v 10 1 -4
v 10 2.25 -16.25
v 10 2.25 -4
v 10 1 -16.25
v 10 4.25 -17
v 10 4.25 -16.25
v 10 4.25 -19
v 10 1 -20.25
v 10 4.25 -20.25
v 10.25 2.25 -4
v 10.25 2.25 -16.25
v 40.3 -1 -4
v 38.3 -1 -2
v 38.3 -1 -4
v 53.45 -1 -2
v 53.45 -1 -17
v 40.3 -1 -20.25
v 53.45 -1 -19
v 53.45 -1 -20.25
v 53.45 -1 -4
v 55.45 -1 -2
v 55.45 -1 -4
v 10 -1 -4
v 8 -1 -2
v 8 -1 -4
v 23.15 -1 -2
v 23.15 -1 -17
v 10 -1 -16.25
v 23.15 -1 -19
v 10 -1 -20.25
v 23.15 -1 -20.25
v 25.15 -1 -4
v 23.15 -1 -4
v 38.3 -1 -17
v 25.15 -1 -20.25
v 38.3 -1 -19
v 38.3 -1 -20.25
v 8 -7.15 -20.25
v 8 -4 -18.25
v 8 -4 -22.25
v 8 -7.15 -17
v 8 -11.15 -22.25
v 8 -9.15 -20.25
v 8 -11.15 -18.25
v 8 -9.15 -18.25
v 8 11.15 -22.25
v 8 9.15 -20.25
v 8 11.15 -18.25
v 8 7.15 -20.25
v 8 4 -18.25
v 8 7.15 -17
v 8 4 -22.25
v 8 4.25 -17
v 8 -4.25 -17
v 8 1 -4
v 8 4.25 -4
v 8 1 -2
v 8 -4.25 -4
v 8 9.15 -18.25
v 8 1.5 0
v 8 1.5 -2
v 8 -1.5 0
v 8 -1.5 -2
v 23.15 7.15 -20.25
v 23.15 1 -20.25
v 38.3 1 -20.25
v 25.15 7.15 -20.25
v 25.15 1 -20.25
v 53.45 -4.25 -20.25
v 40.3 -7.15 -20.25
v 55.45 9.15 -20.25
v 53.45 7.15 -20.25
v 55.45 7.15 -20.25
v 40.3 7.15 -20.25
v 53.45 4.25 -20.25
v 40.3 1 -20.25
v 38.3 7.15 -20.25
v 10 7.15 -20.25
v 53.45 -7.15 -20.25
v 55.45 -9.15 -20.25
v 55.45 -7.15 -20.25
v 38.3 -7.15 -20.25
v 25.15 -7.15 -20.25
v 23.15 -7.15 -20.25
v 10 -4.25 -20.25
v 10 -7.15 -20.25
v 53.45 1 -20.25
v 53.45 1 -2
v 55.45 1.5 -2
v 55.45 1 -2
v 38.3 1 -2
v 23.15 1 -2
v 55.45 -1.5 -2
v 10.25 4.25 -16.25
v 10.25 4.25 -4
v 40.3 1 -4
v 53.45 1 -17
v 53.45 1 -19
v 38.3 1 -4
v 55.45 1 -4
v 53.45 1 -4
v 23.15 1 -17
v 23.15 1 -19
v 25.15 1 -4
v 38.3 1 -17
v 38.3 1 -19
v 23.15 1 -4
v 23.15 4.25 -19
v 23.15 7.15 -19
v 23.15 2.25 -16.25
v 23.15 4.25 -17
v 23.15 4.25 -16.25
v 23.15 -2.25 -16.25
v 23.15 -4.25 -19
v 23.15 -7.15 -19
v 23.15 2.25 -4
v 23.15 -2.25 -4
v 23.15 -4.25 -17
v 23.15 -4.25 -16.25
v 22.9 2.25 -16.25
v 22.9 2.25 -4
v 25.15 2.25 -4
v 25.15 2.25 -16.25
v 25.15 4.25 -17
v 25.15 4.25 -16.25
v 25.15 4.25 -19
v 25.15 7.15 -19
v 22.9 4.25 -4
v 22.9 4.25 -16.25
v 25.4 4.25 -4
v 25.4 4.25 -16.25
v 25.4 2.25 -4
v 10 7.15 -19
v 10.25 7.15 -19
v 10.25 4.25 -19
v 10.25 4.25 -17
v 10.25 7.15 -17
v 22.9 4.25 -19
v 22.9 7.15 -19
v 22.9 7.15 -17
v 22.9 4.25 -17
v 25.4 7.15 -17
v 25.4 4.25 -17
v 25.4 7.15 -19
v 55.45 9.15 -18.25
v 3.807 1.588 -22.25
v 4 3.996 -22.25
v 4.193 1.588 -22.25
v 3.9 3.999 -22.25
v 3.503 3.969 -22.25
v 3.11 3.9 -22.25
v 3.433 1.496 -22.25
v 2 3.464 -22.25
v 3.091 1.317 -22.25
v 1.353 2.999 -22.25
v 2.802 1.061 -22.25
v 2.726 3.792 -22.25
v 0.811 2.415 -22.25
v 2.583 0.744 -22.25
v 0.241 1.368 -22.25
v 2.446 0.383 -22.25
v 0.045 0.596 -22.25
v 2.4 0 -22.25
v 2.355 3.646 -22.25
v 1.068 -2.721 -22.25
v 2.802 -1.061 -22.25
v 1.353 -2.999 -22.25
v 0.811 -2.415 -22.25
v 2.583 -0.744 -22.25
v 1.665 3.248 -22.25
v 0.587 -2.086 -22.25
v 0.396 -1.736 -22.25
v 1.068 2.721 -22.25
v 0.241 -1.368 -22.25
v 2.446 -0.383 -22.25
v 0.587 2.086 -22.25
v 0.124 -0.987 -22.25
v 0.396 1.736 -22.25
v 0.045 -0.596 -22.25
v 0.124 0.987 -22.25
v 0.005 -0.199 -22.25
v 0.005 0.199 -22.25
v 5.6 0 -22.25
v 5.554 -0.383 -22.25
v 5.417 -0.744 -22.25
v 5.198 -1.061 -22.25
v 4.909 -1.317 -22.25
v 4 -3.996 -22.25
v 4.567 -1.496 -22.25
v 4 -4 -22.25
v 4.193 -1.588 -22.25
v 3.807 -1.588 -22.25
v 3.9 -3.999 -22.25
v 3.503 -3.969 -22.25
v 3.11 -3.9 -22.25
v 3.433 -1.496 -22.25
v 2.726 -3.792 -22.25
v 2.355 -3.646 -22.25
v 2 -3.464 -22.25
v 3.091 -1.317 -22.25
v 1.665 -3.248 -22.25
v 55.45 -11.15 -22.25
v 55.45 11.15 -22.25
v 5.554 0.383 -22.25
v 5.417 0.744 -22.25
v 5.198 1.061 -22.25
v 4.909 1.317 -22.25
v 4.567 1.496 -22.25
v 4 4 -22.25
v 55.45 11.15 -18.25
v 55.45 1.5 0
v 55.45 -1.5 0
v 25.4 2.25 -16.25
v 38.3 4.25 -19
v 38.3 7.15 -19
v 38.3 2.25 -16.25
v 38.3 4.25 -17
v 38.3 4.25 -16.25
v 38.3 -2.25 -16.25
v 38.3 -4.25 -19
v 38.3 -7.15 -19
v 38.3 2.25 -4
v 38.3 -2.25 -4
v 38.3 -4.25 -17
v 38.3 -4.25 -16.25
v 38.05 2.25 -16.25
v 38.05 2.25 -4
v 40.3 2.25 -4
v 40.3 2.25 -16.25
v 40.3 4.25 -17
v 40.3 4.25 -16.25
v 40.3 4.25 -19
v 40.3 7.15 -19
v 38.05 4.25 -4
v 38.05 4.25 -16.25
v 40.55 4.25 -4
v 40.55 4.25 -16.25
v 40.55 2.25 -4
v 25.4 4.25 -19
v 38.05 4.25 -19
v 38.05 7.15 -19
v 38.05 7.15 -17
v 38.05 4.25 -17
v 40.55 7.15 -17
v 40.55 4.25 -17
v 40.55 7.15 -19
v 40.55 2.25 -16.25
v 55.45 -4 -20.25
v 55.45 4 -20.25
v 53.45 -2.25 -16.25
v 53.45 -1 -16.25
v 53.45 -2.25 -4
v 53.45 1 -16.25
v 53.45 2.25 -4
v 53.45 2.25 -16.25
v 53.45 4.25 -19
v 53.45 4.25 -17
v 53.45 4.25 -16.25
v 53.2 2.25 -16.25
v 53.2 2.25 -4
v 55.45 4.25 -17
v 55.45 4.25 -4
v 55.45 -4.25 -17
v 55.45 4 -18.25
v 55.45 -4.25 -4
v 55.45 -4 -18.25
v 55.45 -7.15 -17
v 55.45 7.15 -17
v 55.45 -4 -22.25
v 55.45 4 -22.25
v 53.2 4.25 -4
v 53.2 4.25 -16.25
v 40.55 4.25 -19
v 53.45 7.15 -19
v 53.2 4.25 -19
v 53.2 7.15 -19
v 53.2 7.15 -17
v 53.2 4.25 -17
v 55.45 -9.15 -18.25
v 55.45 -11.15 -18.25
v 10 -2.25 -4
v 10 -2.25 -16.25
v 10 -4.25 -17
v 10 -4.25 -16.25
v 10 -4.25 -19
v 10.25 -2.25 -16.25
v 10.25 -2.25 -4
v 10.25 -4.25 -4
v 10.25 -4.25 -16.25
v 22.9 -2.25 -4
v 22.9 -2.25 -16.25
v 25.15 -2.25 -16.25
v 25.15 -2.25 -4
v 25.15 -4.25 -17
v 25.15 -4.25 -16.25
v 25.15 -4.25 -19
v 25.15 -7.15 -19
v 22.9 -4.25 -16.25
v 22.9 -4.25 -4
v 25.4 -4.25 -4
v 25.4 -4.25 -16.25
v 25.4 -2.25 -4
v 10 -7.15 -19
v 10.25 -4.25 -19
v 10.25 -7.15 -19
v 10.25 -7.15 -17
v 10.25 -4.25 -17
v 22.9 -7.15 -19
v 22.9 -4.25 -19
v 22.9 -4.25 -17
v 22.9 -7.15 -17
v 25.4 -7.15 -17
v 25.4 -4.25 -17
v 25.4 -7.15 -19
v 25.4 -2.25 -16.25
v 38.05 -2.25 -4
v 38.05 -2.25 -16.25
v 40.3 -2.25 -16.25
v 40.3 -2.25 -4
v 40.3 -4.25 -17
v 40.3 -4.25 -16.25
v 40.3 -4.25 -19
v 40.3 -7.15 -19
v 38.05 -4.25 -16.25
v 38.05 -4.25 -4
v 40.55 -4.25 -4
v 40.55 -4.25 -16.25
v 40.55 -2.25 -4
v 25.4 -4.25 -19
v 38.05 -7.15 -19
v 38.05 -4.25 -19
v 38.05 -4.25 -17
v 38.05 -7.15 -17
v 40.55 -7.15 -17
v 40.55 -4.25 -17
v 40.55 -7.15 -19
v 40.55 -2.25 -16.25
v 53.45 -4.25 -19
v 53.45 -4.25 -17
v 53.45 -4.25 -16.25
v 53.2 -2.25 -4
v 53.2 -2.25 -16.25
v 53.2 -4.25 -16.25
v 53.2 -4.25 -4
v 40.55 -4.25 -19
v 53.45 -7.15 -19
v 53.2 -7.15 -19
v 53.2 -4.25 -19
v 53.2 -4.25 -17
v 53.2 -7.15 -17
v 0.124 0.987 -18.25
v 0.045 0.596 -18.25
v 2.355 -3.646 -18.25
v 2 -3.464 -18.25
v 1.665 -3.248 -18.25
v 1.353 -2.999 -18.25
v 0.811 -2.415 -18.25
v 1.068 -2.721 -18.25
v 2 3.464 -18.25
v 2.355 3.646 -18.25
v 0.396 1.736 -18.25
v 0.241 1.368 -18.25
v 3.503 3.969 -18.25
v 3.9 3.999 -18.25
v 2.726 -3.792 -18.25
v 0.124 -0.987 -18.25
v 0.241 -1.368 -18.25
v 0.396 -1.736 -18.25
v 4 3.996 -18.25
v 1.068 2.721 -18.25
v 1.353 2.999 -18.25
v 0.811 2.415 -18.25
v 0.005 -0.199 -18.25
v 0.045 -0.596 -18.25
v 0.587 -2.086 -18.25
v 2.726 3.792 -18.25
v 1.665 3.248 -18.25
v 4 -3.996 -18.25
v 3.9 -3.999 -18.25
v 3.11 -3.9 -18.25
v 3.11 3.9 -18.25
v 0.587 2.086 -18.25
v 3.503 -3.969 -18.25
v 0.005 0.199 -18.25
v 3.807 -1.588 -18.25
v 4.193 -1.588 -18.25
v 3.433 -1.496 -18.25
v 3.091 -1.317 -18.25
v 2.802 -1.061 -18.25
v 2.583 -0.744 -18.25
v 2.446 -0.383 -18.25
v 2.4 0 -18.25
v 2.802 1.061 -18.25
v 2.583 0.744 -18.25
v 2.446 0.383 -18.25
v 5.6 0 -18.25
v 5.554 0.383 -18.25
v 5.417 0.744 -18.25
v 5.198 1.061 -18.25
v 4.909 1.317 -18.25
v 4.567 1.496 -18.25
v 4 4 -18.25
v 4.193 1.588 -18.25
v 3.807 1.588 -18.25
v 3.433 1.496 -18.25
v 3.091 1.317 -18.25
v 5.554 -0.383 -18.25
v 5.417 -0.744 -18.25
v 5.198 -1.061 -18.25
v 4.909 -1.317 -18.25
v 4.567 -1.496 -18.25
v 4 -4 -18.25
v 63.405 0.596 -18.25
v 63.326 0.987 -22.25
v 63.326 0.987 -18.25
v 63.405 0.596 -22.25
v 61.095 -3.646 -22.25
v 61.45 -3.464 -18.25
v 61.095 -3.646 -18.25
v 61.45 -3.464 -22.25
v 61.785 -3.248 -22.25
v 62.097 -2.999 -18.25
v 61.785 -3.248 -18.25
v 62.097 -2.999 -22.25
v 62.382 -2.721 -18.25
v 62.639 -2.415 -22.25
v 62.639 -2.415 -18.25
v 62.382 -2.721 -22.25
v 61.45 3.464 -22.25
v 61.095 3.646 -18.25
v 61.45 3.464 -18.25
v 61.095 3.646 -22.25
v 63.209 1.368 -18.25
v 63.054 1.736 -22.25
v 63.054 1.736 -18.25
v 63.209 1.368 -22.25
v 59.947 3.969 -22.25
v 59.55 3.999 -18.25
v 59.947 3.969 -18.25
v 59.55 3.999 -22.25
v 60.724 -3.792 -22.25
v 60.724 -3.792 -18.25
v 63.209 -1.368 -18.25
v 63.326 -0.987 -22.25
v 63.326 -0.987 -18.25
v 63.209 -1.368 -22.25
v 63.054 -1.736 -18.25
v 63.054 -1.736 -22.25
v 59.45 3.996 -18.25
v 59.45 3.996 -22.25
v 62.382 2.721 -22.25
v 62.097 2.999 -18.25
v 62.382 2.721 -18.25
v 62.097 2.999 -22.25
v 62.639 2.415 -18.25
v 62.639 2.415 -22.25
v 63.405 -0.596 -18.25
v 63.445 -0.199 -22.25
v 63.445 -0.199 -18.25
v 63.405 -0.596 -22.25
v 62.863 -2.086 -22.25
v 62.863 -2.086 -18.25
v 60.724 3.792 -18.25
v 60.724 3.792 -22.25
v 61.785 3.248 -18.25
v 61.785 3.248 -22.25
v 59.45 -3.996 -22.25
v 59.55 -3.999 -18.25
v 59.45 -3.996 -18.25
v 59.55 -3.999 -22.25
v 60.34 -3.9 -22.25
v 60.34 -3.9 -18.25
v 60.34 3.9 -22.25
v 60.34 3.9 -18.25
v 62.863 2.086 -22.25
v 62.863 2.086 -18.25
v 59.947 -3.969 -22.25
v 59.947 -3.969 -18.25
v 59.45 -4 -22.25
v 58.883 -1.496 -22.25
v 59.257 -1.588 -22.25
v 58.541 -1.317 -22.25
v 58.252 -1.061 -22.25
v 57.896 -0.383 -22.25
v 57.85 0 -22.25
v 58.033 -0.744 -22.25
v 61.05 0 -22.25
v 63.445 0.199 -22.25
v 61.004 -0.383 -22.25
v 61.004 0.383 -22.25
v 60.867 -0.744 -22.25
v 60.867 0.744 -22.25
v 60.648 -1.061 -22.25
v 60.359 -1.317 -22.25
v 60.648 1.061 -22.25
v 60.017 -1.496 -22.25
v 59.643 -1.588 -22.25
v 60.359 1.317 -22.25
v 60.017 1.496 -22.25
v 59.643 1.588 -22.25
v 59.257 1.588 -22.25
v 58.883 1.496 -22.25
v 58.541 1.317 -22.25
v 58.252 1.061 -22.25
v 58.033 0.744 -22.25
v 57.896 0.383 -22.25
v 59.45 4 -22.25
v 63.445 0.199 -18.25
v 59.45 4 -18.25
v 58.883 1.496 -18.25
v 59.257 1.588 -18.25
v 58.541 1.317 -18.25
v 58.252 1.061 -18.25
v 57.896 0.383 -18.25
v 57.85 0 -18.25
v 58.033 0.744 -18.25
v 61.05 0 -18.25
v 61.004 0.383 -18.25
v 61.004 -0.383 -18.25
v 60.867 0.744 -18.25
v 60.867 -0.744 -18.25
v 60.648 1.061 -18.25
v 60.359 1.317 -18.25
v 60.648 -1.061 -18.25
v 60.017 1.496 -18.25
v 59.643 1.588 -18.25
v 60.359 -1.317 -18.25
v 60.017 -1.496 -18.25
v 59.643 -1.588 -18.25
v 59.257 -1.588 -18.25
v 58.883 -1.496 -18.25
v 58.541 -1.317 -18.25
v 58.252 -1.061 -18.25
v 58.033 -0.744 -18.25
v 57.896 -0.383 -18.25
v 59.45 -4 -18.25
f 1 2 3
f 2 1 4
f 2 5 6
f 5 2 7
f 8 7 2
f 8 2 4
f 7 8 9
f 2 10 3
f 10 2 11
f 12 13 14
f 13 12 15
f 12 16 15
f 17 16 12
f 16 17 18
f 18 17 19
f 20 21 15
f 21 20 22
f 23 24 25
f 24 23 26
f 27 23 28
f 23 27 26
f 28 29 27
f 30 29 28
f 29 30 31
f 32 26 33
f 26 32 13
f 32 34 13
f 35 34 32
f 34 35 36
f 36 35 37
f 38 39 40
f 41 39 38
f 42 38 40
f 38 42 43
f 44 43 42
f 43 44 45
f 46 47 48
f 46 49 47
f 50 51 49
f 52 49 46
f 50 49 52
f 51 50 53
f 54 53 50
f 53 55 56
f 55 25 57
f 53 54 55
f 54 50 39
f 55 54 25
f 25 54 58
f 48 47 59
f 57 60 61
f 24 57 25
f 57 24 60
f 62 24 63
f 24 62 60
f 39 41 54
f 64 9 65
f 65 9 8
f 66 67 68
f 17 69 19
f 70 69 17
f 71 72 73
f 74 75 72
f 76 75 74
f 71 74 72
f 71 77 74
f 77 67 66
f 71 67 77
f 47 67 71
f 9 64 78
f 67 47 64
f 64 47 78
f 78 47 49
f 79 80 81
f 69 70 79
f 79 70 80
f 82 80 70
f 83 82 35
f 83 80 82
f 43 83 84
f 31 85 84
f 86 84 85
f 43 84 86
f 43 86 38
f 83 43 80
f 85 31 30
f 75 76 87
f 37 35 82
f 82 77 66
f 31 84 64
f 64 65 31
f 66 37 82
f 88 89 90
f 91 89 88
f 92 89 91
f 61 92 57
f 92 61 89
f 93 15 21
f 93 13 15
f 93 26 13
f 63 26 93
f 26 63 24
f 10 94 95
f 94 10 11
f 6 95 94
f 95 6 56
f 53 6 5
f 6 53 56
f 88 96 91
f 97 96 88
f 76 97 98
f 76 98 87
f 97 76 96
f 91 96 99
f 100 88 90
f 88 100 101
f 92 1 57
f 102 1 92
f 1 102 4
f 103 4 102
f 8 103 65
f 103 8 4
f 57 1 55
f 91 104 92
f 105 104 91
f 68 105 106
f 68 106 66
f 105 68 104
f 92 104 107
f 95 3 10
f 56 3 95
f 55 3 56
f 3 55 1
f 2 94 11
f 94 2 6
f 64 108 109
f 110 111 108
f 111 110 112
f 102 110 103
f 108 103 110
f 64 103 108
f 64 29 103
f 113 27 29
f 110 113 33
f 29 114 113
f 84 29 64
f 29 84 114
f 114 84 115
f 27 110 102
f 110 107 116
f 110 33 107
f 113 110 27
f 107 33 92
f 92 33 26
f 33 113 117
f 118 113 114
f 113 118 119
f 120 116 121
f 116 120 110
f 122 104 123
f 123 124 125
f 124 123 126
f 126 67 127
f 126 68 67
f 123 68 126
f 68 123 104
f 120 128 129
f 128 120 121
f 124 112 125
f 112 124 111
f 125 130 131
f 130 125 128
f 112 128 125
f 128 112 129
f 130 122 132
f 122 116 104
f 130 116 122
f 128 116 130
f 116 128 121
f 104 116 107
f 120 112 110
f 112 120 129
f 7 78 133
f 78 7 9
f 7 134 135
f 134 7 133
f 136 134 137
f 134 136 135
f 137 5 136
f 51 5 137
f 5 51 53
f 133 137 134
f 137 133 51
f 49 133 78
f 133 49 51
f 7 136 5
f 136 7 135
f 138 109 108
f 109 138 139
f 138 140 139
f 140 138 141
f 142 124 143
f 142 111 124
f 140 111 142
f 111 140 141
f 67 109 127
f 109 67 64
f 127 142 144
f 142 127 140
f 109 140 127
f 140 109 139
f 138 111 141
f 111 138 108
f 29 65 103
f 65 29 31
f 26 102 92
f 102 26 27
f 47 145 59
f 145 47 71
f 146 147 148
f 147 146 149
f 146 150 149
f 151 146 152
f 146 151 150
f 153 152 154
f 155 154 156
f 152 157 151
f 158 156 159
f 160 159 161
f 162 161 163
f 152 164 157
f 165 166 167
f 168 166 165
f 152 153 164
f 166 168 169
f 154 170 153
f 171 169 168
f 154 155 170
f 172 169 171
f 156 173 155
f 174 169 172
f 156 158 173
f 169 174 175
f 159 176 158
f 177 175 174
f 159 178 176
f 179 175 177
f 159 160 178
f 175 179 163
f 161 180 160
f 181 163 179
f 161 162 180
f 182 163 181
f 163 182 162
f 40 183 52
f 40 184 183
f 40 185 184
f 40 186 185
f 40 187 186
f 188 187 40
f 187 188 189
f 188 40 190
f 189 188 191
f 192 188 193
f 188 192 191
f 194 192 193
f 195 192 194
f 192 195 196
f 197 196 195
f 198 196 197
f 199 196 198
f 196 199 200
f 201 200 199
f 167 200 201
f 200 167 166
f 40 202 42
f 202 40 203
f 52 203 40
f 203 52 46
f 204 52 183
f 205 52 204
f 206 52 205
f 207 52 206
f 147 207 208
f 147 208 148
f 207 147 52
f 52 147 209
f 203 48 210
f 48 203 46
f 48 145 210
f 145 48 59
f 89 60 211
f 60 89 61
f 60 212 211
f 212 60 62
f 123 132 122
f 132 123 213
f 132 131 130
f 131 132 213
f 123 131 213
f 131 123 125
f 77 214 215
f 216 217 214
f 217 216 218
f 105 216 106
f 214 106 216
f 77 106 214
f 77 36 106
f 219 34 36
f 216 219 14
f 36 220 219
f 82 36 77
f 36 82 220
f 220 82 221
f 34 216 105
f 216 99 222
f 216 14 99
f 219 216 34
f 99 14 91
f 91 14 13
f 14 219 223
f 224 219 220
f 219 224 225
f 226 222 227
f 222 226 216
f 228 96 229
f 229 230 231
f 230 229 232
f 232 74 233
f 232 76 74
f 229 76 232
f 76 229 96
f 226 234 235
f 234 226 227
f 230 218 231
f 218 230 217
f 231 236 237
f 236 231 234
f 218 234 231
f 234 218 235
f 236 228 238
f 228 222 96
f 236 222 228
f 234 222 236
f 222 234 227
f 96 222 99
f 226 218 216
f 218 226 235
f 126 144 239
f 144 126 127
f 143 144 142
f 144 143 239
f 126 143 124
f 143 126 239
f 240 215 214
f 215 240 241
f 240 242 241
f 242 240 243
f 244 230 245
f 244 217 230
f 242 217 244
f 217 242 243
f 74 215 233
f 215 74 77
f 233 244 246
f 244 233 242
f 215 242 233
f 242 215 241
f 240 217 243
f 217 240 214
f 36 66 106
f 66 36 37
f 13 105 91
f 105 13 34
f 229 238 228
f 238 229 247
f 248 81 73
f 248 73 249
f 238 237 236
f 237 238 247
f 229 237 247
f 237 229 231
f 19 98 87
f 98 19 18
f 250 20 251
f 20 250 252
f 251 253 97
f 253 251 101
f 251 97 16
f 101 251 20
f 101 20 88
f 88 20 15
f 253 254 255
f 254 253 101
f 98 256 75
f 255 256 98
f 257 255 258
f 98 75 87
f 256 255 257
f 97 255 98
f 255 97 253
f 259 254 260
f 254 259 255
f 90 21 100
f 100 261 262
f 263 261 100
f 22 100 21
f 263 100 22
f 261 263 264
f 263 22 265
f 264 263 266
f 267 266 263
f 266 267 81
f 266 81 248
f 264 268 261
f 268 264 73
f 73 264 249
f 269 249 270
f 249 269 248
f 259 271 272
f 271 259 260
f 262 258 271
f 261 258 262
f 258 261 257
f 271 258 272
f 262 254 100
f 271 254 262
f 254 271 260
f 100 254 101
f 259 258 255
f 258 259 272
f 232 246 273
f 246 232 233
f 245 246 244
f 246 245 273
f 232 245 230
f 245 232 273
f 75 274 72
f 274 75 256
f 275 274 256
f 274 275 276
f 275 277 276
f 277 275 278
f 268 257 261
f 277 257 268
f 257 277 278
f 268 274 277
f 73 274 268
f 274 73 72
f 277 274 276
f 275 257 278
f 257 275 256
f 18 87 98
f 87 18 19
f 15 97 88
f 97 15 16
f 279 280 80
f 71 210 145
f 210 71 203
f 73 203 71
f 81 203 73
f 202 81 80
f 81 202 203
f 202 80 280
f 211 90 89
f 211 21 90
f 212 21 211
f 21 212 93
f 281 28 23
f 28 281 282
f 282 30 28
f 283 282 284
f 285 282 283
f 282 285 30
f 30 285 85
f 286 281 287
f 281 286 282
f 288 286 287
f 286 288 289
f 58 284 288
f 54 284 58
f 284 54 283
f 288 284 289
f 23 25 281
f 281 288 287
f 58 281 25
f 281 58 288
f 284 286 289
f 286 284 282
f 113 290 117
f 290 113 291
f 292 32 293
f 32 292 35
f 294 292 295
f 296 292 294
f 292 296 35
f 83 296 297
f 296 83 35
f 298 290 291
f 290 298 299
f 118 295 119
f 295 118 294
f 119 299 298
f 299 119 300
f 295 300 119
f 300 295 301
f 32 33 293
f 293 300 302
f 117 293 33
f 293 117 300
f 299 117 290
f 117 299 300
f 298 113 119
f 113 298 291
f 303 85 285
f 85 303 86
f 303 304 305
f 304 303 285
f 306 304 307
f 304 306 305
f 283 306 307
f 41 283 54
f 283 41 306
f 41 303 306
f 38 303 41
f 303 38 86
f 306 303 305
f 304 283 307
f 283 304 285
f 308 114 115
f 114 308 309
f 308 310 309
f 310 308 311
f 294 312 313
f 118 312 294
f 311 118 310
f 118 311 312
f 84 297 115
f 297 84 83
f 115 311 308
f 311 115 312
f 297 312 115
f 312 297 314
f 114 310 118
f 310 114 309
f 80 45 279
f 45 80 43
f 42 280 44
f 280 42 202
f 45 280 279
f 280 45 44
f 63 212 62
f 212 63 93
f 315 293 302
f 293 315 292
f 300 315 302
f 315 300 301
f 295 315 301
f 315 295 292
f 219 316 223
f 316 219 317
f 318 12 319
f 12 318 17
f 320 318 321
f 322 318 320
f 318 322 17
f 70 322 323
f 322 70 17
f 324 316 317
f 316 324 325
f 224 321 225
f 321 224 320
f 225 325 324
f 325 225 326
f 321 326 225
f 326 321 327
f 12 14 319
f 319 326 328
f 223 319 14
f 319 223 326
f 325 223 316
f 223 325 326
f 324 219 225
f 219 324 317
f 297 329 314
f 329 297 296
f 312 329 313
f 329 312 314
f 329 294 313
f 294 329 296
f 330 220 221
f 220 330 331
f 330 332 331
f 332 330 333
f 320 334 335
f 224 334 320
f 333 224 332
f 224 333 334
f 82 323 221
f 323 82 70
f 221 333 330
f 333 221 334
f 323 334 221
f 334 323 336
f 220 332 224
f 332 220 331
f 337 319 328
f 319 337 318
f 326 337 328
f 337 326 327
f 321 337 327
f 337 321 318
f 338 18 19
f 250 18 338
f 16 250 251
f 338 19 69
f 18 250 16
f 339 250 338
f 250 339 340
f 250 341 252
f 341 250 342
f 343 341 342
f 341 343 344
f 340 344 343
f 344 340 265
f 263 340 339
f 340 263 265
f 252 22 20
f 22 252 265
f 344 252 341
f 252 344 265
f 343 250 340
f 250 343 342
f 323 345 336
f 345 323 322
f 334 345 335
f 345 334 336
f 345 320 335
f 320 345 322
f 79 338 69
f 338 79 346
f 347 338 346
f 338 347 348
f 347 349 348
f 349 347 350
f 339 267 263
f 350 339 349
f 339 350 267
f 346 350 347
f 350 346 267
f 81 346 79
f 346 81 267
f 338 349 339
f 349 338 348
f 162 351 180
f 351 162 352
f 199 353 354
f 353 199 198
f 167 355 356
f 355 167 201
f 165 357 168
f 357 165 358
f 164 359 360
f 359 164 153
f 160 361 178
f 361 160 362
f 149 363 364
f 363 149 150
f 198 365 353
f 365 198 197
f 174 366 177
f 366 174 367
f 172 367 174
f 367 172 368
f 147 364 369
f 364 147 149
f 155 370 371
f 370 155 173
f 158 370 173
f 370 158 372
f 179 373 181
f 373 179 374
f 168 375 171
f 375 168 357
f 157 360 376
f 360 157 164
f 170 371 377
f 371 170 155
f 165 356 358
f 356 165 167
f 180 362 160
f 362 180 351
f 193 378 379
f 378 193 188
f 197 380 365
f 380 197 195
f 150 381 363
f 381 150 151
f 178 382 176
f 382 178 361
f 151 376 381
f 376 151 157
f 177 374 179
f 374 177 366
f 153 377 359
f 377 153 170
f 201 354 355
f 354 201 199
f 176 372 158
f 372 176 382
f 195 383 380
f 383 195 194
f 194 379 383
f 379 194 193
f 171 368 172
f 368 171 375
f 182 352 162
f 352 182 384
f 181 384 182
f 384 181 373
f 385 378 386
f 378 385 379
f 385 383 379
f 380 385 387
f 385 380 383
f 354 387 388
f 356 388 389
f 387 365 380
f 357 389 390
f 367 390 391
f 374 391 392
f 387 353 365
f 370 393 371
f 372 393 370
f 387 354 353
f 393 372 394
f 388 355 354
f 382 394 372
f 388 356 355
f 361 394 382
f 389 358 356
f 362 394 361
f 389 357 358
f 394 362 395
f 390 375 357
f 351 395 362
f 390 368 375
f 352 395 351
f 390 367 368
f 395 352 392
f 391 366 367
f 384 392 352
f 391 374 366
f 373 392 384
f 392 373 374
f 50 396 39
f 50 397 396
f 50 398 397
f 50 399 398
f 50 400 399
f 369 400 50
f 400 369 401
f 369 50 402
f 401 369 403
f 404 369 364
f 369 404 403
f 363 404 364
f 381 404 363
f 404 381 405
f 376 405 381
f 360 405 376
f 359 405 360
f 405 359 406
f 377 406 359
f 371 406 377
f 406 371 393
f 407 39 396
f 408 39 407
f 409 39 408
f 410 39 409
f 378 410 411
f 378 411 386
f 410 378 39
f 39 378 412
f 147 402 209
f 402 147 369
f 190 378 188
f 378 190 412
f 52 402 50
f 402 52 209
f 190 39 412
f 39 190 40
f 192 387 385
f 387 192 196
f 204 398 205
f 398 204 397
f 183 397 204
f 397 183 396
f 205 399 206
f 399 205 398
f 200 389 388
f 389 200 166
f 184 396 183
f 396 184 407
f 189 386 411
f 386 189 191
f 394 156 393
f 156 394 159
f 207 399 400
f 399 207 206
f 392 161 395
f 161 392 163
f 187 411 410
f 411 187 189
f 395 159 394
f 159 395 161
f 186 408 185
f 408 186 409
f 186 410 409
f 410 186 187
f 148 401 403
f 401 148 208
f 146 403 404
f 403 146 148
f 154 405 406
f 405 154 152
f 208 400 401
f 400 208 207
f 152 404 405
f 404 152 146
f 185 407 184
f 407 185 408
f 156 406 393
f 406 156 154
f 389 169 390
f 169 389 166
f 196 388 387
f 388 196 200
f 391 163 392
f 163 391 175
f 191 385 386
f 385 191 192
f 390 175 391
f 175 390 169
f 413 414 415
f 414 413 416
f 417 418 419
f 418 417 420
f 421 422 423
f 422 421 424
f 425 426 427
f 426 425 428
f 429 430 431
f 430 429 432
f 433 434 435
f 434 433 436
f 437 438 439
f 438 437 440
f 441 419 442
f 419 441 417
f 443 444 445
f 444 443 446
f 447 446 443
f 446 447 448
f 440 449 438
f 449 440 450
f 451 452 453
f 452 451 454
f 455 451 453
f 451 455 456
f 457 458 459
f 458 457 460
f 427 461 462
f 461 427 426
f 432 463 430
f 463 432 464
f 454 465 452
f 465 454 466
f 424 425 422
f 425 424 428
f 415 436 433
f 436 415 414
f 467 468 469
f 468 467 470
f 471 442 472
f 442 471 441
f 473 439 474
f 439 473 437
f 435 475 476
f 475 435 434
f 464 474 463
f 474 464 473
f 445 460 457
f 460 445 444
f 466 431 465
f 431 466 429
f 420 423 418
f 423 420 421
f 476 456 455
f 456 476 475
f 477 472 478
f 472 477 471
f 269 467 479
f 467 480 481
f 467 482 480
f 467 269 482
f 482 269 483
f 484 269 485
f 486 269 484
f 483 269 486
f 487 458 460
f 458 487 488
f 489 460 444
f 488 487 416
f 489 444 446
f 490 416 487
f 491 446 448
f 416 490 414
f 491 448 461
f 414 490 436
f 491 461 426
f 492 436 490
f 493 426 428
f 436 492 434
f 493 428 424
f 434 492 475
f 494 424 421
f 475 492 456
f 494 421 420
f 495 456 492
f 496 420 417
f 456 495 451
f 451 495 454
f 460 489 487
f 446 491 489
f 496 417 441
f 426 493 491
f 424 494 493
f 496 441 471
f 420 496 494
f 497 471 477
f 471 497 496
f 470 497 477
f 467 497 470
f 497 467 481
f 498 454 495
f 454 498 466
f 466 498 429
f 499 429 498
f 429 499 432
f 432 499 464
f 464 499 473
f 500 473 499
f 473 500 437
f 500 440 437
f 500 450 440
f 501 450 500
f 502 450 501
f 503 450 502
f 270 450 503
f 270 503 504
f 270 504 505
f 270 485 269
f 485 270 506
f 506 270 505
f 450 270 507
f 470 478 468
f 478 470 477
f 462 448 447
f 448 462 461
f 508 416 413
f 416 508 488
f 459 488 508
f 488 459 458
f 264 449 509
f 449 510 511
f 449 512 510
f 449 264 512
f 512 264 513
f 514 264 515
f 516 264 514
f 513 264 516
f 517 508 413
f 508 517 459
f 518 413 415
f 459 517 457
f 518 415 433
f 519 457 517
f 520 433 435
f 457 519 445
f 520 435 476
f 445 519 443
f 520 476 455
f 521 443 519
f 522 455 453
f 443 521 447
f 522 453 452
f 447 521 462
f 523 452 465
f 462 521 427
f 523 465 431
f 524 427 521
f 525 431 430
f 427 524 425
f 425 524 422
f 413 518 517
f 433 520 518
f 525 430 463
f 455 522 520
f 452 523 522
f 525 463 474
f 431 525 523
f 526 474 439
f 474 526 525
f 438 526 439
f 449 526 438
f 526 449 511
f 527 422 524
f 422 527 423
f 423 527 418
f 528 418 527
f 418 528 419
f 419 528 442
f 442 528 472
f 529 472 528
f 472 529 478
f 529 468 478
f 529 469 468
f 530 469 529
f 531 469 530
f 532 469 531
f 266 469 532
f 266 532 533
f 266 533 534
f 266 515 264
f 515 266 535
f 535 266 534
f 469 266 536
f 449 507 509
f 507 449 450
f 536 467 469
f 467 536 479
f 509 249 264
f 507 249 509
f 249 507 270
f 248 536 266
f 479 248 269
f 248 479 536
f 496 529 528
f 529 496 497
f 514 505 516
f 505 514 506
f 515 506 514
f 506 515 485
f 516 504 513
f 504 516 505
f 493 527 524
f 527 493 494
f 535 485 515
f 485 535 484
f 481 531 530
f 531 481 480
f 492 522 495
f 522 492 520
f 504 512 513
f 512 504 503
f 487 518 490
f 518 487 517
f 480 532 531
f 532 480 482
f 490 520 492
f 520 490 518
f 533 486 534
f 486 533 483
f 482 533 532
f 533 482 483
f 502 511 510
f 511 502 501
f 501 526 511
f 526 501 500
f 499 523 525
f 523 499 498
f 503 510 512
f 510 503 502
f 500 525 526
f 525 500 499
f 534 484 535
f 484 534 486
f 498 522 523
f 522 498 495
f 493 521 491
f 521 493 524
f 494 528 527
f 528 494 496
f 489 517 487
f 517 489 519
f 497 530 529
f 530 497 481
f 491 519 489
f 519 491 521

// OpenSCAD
// ////////////////////////////////////////////////
//
// WAGO 221 mount
//
// Creates a single row or double row set of 221 blocks
// with mounting tabs/ears at either end.
//
// Created - 2017/01/01 by Joo Chung
//
// ////////////////////////////////////////////////

// ////////////////////////////////////////////////
// vector of blocks. each element specifies the number of conductors for that block
// EDIT THIS
blocks = [2,2,2]; // a single 5 conductor blocks 
// blocks = [5, 3, 2]; // a set of 5 conductor, 3 conductor, 2 conductor blocks
// blocks = [5, 5, 5]; // a set of three 5 conductor blocks
// blocks = [2]; // a single 2 conductor block
// blocks = [3]; // a single 3 conductor block


// ////////////////////////////////////////////////
// Mirror the mount, stand it up, and put tabs on bottom.
// 0 - no mirror, 1 - mirror, rotate so its standing up, and reposition tabs
// 2 - mirror, rotate so that they are laying flat, and reposition tabs.
// EDIT THIS
mirror = 1;

// ////////////////////////////////////////////////
// Tabs - include or exclude mounting tabs
// EDIT THIS: 0 - no tabs, 1 - tabs
tabs = 1;
// EDIT THIS: radius of hole in tab
tabradius = 1.6  ;
// EDIT THIS: thickness of tab
tabheight = 4   ;
// EDIT THIS: Set width and length of the tab. (tab is basically a square)
tabwidth = 8    ;



// ////////////////////////////////////////////////
// Block dimensions in mm -- DO NOT EDIT
conwidth = 5.6; // width of a single conductor
// DO NOT EDIT
border = 1.75; // block transparent plastic border
// DO NOT EDIT
blockdepth = 18.25;
// DO NOT EDIT
fudge = 0.2;

// ////////////////////////////////////////////////
// OpenSCAD special variables -- DO NOT EDIT
$fa = 1;
// DO NOT EDIT
$fs = 0.4;

// ////////////////////////////////////////////////
// Functions
function bw(x) = conwidth*x+border+fudge; // block width
function mw(i, n) = ( i==0 ? bw(blocks[i]) + 2 + mw(i+1, n) : (i < n ? bw(blocks[i]) + 2 + mw(i+1, n) : 0)); // mount width (index, max index)


// ////////////////////////////////////////////////
// Modules
module tab(width, hole, thickness) {
    difference() {
        union () {
            cylinder(thickness,width/2,width/2, true);
            translate([width/4,0,0]) cube([width/2,width,thickness], true);
        }
    cylinder(width,hole,hole, true);
    }
}

module shoulder (depth) {
    difference () {
        union () {
            cube([2, blockdepth, 3.25], false);
            translate([0,0,3.25]) cube([2.25, blockdepth, 2], false);
        }
        translate([0,0,2]) cube([2.25,2,3.25], false);
        translate([2,blockdepth-4,2]) cube([0.25,4,3.25], false);
    }
}


module backshoulder (height) {
    difference() {
        union() {  
            translate([0, 2, 0]) cube ([2, 1.25, 10.15]);
            cube ([2.25, 2, 10.15]);
        }
        translate([0,0,10.15-2]) cube([2.25,3.25,2]);
        translate([2,0,2]) cube([1.25,3.25,3.25]);
    }
}



// WAGO 221 block
module block (nconn) {
    blockwidth = bw(nconn);

    // base
    translate([2,2,0]) cube([blockwidth, blockdepth, 2], false);
    
    // back headboard
    translate([0,blockdepth+2,0]) cube([blockwidth+4, 2, 10.15], false);

    // back lip
    translate([0,blockdepth,10.15]) cube([blockwidth+4, 4, 2], false);
    
    // front lip
    translate([0,0,0]) cube([blockwidth+4, 2, 2.5], false);

    // left shoulder and right shoulders
    translate([0,2,0]) shoulder();
    translate([blockwidth+4,2,0]) mirror() shoulder(); 
    
    // back left and shoulder
    translate([0, blockdepth-1.25, 0]) backshoulder(); 
    translate([blockwidth+4, blockdepth -1.25, 0]) mirror() backshoulder();
    
}



// ////////////////////////////////////////////////
// MAIN BODY

mountwidth=mw(0, len(blocks));
if (mirror==0) { // No mirror. Single row of blocks
    // create array of blocks
    for (i=[0:len(blocks)-1]) {
        offset = (i==0) ? tabwidth : tabwidth + mw(0, i);
        translate([offset, 0, 0]) block(blocks[i]);
    }
    
    // left and right tabs
    if (tabs==1) {
        translate([tabwidth/2,(blockdepth+4)/2,tabheight/2]) tab (tabwidth, tabradius, tabheight);
        translate([mountwidth+2+tabwidth+tabwidth/2,(blockdepth+4)/2,tabheight/2]) mirror() tab (tabwidth, tabradius, tabheight);
    }
} else if (mirror==1) { // Mirrored. two rows of blocks, back to back.
    // Row #1. Stand up on headboard.
    rotate([-90,0,0]) for (i=[0:len(blocks)-1]) {
        offset = (i==0) ? tabwidth : tabwidth + mw(0, i);
        translate([offset, 0, -1]) block(blocks[i]);
    }
    
    // Row #2. Opposite rotation. Stand up on headbord
    rotate([90,0,0]) mirror ([0, 1, 0]) for (i=[0:len(blocks)-1]) {
        offset = (i==0) ? tabwidth : tabwidth + mw(0, i);
        translate([offset, 0, -1]) block(blocks[i]);
    }   
    
    // left and right tabs
    if (tabs==1) {
        translate([tabwidth/2,0,-blockdepth-tabheight/2]) tab (tabwidth, tabradius, tabheight);
        translate([mountwidth+2+tabwidth+tabwidth/2,0,-blockdepth-tabheight/2]) mirror() tab (tabwidth, tabradius, tabheight);
    }
} else if (mirror==2) {
    // Row #1. 
    for (i=[0:len(blocks)-1]) {
        offset = (i==0) ? tabwidth : tabwidth + mw(0, i);
        translate([offset, -blockdepth-6, -1]) block(blocks[i]);
    }
    
    // Row #2. Flip
    mirror ([0, 1, 0]) for (i=[0:len(blocks)-1]) {
        offset = (i==0) ? tabwidth : tabwidth + mw(0, i);
        translate([offset, -blockdepth, -1]) block(blocks[i]);
    }   
    
    // left and right tabs
    if (tabs==1) {
        translate([tabwidth/2,-3,(tabheight-2)/2]) tab (tabwidth, tabradius, tabheight);
        translate([mountwidth+2+tabwidth+tabwidth/2,-3,(tabheight-2)/2]) mirror() tab (tabwidth, tabradius, tabheight);
    }
}
